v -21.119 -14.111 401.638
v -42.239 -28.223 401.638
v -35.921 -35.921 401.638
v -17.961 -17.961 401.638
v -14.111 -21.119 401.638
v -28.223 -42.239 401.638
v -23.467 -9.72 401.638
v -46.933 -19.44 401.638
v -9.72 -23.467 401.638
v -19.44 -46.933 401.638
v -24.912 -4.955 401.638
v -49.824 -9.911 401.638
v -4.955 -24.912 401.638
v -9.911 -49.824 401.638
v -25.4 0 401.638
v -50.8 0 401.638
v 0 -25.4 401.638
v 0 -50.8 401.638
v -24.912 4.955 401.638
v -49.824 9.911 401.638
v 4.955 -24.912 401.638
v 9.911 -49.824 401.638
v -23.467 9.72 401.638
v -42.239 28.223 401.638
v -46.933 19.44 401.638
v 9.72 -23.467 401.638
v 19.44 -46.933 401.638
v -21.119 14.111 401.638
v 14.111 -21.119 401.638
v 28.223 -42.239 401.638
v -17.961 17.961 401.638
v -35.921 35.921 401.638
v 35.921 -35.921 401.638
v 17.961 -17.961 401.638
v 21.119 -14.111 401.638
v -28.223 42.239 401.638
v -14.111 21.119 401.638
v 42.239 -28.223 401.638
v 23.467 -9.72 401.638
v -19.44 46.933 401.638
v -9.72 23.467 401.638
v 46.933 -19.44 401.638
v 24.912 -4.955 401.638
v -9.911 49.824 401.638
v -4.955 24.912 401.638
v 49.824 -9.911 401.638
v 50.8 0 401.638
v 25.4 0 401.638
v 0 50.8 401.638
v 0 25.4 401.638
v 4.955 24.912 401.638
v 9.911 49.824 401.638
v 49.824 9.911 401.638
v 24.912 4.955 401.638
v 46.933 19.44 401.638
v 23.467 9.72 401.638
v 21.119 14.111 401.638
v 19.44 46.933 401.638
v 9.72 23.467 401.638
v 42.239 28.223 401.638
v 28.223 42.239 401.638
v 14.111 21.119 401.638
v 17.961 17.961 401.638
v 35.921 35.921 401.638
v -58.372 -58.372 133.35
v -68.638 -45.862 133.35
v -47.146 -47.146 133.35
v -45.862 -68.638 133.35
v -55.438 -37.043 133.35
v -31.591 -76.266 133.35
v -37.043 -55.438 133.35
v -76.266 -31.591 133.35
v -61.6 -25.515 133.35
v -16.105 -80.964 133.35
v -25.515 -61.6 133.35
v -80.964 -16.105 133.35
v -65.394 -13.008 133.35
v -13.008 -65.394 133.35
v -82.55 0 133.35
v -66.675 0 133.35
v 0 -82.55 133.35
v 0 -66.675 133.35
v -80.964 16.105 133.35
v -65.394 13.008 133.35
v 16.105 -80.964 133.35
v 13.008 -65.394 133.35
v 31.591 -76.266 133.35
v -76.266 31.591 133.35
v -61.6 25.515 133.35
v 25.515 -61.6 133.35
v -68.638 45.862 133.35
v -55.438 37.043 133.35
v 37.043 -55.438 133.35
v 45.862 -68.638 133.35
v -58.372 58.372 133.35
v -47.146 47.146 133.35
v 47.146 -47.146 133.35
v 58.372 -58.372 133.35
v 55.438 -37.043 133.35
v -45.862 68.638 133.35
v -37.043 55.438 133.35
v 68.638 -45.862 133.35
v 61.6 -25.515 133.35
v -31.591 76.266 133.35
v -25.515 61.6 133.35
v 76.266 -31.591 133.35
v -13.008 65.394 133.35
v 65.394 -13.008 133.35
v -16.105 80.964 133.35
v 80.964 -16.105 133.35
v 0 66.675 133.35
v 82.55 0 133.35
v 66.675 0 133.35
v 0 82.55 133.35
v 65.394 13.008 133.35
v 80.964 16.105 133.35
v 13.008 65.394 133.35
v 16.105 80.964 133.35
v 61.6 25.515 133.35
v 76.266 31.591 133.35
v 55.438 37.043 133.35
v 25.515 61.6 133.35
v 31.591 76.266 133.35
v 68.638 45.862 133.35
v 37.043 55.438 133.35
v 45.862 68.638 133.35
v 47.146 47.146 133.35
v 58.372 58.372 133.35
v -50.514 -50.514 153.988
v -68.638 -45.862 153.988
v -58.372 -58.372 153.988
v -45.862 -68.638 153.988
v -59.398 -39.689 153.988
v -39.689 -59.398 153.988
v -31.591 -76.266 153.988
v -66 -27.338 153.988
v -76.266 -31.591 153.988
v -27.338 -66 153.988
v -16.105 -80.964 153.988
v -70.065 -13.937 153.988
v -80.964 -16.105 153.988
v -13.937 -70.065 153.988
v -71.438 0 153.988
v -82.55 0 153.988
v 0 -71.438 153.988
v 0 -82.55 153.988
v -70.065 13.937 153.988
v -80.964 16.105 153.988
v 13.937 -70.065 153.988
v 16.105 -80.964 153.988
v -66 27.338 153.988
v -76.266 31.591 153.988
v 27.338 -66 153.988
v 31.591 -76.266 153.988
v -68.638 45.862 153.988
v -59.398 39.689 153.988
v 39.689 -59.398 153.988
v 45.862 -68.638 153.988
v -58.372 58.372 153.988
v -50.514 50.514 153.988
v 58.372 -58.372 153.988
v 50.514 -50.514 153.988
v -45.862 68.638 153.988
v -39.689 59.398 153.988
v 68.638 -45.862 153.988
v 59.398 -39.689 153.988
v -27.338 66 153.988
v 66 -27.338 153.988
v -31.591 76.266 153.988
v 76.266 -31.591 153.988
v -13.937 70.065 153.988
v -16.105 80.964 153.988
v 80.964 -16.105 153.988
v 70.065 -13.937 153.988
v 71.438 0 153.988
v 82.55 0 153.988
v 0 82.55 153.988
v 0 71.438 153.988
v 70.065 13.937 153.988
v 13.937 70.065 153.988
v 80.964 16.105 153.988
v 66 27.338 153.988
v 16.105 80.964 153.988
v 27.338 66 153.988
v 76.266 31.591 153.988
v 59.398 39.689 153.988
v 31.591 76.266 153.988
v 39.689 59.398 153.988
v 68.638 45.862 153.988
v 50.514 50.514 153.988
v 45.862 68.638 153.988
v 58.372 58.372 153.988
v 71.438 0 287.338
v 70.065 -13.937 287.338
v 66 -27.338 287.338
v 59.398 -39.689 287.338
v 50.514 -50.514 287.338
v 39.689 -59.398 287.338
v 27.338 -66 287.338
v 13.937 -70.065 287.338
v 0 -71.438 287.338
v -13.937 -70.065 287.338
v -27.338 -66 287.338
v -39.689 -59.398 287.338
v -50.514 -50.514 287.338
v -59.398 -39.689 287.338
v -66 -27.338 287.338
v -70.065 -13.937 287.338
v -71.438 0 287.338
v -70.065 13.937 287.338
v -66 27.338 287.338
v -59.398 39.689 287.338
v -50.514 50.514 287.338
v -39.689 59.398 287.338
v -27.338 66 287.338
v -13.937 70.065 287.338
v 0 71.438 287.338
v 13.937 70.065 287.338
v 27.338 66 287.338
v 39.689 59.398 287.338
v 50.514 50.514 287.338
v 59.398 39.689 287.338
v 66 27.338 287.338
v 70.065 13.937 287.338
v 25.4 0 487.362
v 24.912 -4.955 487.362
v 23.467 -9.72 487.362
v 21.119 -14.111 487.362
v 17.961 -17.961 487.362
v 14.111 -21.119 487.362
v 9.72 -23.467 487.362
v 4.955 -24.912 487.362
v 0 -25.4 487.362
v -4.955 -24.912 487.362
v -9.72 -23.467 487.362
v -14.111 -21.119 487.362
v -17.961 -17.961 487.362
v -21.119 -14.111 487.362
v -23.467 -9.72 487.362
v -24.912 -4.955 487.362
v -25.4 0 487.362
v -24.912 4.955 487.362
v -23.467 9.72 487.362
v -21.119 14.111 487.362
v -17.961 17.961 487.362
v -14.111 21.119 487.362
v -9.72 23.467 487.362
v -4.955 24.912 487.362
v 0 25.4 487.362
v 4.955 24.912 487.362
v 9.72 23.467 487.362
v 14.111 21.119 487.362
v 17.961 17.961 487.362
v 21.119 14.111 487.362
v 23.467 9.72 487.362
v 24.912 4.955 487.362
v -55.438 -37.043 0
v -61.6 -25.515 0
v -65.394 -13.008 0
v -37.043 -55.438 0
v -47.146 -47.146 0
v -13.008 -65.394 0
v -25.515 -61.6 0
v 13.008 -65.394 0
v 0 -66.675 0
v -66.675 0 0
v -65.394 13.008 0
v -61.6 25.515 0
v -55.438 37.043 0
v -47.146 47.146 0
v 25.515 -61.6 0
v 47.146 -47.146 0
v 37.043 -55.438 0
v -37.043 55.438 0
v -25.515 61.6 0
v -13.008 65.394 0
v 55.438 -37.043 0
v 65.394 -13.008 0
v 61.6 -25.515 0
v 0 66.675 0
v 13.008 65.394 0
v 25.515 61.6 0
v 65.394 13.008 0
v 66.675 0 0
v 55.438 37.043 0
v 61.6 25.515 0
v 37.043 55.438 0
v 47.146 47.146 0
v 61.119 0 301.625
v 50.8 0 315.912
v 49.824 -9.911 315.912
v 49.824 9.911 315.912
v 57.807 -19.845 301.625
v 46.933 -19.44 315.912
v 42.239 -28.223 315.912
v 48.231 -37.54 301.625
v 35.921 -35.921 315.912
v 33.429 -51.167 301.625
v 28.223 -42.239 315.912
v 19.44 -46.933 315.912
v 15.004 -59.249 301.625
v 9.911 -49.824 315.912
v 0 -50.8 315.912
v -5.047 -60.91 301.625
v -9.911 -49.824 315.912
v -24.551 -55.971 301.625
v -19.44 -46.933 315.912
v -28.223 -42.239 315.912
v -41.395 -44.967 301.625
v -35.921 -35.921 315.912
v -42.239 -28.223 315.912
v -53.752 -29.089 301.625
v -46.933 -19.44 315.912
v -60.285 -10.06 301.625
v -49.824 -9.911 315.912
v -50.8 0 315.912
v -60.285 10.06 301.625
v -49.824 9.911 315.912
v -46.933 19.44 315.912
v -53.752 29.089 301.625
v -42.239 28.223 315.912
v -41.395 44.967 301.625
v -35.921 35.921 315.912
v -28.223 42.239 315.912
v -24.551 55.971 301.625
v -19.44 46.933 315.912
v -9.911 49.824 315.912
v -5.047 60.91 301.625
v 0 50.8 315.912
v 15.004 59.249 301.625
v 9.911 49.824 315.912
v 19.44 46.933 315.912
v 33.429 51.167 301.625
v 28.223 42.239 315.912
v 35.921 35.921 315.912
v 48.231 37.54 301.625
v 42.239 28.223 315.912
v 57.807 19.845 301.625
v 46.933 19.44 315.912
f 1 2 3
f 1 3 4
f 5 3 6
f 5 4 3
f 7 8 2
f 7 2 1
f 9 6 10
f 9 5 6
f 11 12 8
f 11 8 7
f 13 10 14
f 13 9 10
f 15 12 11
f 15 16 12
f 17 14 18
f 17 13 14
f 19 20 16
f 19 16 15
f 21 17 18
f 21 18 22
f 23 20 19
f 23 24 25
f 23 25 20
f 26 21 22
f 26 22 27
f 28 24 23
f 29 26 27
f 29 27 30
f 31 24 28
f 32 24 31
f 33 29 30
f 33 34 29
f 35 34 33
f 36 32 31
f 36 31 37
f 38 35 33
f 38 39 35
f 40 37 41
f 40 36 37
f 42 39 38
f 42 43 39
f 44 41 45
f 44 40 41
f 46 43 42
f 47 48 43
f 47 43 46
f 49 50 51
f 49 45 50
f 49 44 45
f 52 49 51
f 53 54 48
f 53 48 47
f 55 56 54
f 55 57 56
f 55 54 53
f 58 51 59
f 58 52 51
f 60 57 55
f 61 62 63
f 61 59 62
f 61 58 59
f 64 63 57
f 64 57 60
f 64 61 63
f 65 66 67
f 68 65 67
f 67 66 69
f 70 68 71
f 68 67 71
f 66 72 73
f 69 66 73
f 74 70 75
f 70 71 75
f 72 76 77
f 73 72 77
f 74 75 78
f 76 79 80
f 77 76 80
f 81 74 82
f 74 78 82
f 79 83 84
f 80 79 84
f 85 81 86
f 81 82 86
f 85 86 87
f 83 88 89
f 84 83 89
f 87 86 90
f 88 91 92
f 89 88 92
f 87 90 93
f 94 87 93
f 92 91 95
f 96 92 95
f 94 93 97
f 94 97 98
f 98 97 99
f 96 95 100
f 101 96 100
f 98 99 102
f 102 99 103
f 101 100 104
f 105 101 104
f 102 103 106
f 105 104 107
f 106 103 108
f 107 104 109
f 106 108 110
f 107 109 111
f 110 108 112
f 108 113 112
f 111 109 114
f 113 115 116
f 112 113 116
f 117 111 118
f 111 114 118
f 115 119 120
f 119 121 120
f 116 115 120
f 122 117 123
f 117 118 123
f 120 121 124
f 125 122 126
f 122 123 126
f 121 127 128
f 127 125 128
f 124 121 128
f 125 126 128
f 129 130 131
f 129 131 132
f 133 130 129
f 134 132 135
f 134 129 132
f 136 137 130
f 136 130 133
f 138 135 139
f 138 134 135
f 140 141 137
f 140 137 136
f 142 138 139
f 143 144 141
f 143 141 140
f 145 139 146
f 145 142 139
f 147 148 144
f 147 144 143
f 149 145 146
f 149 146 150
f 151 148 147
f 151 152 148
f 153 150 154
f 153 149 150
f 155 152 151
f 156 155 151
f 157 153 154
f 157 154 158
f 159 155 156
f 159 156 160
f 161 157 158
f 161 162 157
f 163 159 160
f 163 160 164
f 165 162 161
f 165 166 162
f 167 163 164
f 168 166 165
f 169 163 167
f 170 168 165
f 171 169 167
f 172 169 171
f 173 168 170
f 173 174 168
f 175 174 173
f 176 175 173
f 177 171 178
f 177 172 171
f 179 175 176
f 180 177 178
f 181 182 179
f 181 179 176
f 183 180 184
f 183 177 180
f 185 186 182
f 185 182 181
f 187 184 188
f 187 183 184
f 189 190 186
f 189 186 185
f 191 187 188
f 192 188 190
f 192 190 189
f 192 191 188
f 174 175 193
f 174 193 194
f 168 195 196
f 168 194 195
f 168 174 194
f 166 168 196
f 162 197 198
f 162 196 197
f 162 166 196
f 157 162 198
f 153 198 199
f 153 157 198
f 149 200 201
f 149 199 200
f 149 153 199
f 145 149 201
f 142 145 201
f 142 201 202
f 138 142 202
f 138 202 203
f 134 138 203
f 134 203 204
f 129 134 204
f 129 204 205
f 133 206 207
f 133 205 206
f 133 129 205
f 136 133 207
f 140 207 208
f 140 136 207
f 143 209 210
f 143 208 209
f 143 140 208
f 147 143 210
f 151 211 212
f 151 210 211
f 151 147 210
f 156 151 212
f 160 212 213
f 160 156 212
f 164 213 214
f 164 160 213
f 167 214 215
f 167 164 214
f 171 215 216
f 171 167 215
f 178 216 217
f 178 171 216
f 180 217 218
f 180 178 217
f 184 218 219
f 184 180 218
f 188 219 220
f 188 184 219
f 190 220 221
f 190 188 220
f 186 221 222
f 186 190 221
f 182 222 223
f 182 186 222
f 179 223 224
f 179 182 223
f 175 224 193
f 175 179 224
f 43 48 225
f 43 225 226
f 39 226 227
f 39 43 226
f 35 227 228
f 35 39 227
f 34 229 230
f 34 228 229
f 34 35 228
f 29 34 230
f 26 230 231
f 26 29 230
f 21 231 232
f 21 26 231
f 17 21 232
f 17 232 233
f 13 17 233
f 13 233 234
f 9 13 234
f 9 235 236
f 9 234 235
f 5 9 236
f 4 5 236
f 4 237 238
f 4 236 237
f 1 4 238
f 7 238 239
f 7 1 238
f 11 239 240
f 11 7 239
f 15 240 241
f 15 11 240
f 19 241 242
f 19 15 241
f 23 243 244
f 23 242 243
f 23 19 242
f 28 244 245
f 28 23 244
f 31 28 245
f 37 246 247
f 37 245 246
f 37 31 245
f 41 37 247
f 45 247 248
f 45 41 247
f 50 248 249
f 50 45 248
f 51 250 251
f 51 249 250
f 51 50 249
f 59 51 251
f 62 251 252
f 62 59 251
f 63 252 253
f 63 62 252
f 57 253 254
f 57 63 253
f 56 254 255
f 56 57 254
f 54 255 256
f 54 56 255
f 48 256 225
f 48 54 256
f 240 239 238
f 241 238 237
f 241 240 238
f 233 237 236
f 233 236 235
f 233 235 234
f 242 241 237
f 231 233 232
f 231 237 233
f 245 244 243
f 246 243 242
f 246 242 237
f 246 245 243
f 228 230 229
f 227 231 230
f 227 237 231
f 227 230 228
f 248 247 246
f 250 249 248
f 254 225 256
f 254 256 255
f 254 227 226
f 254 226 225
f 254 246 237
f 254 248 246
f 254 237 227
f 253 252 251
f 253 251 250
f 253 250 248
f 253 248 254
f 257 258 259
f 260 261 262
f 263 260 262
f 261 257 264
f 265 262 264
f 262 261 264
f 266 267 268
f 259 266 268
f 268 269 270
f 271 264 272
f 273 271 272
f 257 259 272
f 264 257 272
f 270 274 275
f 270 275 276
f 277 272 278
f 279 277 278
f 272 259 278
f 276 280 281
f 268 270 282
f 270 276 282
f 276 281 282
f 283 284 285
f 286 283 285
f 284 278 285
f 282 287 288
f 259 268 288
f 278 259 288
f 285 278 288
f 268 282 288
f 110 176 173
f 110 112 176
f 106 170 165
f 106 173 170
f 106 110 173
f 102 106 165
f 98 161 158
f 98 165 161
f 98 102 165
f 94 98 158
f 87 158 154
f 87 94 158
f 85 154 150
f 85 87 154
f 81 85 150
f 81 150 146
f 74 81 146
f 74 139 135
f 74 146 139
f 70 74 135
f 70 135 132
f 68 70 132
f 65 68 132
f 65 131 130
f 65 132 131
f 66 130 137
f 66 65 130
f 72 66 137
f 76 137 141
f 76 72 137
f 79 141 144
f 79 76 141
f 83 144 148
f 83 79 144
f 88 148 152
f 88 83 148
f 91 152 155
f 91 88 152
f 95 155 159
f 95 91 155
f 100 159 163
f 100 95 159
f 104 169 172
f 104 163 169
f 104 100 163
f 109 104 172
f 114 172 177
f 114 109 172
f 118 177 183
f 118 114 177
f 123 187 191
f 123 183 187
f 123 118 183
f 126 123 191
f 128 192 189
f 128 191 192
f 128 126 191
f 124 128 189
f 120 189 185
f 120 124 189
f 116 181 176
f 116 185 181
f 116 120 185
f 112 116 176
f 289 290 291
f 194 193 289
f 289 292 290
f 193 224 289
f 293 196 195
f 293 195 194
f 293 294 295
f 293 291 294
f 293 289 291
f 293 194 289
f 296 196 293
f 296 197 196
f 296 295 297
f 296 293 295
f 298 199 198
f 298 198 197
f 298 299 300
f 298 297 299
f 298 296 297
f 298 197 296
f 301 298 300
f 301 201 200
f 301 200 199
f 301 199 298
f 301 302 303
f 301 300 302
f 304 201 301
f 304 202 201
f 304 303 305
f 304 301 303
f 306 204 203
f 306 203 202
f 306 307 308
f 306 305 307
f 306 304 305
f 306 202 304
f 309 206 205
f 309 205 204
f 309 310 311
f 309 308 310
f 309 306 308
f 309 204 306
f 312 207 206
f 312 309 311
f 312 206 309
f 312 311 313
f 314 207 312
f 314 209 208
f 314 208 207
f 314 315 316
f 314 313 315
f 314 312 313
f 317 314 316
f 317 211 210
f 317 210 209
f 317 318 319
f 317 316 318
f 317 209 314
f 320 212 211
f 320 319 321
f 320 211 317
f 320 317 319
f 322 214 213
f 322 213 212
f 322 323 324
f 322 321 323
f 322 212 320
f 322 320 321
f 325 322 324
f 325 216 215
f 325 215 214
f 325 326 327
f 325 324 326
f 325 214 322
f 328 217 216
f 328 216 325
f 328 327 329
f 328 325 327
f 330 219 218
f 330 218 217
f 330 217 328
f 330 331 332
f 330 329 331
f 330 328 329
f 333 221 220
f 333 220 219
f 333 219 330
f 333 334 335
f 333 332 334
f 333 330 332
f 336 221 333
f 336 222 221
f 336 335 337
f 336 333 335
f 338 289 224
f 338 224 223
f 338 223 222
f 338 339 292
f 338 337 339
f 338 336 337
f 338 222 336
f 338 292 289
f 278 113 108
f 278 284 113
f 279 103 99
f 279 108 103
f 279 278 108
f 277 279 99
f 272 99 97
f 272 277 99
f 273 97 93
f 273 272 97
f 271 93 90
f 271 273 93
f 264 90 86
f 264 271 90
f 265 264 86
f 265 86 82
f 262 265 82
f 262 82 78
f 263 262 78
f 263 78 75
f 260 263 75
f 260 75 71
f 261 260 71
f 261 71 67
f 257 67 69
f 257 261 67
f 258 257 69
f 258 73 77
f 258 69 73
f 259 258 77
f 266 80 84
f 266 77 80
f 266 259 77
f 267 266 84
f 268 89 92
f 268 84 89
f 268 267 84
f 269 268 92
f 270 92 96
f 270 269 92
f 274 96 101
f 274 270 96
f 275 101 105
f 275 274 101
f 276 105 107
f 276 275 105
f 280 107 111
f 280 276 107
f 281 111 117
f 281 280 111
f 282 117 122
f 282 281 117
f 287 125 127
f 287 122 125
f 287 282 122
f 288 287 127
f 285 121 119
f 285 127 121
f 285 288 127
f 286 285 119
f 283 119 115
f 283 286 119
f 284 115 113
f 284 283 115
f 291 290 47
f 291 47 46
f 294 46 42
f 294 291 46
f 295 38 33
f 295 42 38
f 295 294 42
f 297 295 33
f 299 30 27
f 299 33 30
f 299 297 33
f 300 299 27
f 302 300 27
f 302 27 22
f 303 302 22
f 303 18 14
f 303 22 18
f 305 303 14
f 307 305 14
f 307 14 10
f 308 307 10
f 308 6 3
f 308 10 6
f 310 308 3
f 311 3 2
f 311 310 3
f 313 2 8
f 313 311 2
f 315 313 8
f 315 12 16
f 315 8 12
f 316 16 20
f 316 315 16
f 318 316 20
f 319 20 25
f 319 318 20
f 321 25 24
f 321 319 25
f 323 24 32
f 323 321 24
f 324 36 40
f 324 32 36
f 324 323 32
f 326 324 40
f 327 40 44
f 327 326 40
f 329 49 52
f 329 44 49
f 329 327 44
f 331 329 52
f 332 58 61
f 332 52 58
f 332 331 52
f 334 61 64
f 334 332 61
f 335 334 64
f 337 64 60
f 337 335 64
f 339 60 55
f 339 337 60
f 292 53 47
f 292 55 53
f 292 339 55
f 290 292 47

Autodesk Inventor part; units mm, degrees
ref_plane "YZ Plane" through (0, 0, 0) normal (1, 0, 0) x (0, 1, 0)
ref_plane "XZ Plane" through (0, 0, 0) normal (0, 1, 0) x (-1, 0, 0)
sketch "Sketch1" plane through (0, 0, 0) normal (0, 0, 1) x (1, 0, 0)
  circle A0 centre (0, 0) radius 66.675
  dimension "d0" = 133.35
extrude "Extrusion1" add sketch "Sketch1" along normal blind 133.35
sketch "Sketch2" plane through (0, 0, 133.35) normal (0, 0, 1) x (1, 0, 0)
  circle A0 centre (0, 0) radius 82.55
  dimension "d3" = 165.1
extrude "Extrusion2" add sketch "Sketch2" along normal blind 20.6375
sketch "Sketch3" plane through (0, 0, 153.9875) normal (0, 0, 1) x (1, 0, 0)
  circle A0 centre (0, 0) radius 71.4375
  dimension "d6" = 142.875
extrude "Extrusion3" add sketch "Sketch3" along normal blind 133.35
sketch "Sketch4" plane through (0, 0, 287.3375) normal (0, 0, 1) x (1, 0, 0)
  circle A0 centre (0, 0) radius 50.8
  dimension "d9" = 101.6
extrude "Extrusion4" add sketch "Sketch4" along normal blind 114.3
sketch "Sketch5" plane through (0, 0, 401.6375) normal (0, 0, 1) x (1, 0, 0)
  circle A0 centre (0, 0) radius 25.4
  dimension "d12" = 50.8
extrude "Extrusion5" add sketch "Sketch5" along normal blind 85.725
ref_plane "Work Plane1" through (0, 0, 487.3625) normal (0, 1, 0) x (0, 0, 1)
sketch "Sketch6" plane through (0, 0, 487.3625) normal (0, 1, 0) x (0, 0, 1)
  line L0 (-200.025, -71.4375) -> (-200.025, 71.4375) projected
  line L1 (-171.45, 50.8) -> (-200.025, 71.4375)
  line L2 (-85.725, -50.8) -> (-85.725, 50.8) projected
  line L3 (-85.725, 50.8) -> (-200.025, 50.8)
  line L4 (-200.025, 71.4375) -> (-200.025, 50.8)
  line L5 (-584.835, 0) -> (97.4725, 0) projected
  point P0 (-487.3625, 0)
  dimension "d21" = 28.575
revolve "Revolution1" add sketch "Sketch6" angle 360 about axis through (0, 0, 487.3625) along (0, 0, 1) contours L0 L1 L3
properties part number "BC501A _Organic_scintillator_module"
